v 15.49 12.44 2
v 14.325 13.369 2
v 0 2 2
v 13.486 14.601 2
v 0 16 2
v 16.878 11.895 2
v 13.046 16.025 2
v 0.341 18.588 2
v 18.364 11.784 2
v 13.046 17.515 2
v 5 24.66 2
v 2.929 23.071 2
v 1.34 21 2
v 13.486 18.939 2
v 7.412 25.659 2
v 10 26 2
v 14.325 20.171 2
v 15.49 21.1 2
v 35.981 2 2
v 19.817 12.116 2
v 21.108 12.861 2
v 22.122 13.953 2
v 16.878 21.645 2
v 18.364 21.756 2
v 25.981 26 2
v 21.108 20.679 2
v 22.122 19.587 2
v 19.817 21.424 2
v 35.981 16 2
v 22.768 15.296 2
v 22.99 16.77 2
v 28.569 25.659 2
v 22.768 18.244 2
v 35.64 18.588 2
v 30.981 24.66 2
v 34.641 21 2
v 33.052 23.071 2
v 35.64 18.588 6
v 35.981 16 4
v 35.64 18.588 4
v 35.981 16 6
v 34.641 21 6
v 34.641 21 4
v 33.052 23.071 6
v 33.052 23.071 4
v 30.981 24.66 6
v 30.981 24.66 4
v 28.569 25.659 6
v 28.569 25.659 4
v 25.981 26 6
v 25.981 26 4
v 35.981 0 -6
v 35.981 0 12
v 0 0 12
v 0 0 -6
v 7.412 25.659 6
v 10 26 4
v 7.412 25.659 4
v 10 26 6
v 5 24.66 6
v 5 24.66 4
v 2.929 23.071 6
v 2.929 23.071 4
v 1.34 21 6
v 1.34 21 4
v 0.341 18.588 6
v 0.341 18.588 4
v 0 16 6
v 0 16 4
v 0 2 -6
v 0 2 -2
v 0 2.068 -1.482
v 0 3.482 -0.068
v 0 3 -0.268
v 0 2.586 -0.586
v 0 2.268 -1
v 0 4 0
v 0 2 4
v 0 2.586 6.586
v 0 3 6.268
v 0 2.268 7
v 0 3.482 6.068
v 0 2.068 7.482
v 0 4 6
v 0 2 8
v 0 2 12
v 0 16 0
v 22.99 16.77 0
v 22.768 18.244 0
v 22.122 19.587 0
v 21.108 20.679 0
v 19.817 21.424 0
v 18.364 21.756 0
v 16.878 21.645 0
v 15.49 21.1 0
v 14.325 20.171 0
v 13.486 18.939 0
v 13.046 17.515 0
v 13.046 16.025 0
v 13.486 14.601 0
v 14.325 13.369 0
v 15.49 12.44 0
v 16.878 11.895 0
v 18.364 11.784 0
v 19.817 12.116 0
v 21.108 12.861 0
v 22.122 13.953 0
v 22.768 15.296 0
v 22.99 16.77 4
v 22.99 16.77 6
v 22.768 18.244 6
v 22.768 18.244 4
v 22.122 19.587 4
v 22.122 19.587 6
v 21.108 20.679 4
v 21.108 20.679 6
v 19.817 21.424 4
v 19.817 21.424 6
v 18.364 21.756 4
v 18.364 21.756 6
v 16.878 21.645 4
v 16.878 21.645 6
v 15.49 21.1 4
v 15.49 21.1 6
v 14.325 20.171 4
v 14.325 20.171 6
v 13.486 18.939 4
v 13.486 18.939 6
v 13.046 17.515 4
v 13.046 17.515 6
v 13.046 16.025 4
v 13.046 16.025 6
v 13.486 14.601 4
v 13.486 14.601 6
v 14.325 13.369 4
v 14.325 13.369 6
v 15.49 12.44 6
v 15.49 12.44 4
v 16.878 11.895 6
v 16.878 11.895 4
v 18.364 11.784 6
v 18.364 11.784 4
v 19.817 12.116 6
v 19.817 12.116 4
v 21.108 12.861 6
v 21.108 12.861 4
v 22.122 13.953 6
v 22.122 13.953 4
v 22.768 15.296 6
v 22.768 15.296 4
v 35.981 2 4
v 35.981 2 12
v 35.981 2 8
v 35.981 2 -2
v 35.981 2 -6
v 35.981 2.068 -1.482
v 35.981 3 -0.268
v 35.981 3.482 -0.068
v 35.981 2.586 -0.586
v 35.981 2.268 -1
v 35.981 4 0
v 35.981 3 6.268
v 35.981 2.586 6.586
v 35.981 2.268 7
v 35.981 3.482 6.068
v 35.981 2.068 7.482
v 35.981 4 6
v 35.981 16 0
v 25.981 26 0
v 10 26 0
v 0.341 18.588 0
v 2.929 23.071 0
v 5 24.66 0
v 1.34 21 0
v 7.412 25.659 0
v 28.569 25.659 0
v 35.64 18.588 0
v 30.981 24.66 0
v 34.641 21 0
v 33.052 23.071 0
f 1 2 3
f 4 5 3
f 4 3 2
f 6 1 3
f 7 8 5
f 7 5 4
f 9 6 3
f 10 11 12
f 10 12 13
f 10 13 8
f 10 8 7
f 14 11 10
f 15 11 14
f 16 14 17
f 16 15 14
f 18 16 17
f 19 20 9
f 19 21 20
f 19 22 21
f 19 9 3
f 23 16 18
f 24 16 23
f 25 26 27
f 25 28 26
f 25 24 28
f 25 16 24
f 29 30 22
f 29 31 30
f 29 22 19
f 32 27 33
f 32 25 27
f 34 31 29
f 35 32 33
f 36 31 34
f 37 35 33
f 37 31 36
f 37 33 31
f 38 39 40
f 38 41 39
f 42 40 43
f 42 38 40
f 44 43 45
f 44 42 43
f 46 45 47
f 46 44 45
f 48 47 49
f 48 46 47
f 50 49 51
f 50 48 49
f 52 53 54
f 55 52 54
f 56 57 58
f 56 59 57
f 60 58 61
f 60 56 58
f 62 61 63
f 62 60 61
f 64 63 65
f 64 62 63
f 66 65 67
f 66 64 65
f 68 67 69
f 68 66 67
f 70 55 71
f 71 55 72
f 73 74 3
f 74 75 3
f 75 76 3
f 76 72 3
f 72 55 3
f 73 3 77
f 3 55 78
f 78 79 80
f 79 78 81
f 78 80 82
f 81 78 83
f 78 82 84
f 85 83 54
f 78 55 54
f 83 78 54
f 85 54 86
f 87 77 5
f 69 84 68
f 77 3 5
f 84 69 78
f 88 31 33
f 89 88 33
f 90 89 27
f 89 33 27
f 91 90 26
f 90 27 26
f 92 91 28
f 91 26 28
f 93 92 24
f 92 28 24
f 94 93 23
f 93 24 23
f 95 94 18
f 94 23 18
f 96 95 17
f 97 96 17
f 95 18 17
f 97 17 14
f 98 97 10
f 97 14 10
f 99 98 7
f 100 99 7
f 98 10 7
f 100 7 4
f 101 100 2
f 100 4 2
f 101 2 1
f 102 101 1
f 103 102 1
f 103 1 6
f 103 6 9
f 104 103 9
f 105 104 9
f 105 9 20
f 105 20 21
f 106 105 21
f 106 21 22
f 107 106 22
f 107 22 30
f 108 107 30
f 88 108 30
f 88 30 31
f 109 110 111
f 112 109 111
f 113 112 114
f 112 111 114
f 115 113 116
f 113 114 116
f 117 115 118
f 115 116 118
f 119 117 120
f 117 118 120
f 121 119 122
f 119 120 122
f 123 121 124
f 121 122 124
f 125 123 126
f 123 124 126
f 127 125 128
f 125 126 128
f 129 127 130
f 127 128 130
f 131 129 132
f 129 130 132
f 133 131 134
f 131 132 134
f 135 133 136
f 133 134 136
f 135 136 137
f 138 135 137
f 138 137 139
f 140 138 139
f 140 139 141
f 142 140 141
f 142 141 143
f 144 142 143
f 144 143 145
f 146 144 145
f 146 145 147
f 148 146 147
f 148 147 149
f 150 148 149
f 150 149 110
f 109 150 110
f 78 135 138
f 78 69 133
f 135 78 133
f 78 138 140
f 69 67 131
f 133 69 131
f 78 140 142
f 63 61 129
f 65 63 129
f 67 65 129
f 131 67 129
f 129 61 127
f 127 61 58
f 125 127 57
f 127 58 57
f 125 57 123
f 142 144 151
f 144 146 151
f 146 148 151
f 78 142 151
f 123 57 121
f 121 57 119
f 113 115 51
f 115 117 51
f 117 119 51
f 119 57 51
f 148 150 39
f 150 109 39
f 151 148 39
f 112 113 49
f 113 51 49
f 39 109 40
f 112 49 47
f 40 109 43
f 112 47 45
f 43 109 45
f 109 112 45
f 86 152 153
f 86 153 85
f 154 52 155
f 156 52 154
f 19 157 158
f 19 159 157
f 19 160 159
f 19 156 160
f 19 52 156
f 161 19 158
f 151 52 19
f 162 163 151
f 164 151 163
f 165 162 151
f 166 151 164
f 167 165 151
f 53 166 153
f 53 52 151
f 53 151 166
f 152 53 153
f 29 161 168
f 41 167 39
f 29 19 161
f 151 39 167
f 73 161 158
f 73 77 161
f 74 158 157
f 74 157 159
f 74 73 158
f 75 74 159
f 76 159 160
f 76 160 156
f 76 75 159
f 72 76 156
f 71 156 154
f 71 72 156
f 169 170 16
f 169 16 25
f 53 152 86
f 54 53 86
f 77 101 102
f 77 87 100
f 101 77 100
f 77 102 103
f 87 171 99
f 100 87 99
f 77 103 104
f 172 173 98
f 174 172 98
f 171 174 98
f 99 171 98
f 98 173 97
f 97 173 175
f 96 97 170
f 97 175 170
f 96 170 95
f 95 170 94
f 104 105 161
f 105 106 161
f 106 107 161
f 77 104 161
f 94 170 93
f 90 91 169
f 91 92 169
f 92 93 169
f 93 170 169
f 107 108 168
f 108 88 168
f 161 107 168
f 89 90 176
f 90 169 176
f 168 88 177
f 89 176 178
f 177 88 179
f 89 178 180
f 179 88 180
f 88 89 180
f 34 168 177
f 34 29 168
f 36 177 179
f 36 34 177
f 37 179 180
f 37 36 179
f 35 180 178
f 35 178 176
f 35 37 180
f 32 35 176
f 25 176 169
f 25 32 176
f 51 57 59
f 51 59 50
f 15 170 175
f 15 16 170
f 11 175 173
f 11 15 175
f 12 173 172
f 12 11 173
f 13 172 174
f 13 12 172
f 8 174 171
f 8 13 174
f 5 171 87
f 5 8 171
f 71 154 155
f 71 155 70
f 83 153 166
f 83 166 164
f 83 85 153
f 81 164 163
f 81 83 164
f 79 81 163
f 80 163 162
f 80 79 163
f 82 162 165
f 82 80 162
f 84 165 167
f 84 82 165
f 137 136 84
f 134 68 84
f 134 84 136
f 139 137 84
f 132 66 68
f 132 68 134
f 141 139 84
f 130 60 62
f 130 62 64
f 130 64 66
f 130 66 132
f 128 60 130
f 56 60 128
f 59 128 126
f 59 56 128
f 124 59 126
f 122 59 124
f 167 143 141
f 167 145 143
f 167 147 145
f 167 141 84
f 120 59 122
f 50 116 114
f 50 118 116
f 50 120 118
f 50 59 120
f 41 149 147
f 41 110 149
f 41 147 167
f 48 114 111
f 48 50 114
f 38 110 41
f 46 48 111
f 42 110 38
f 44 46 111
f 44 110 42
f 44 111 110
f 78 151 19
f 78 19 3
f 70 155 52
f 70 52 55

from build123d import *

# Parameters (mm, degrees)
SKETCH1_W                = 35.980750028
SKETCH1_H                = 26
BOSS_EXTRUDE1_DEPTH      = 2
LPATTERN1_COUNT          = 2
LPATTERN1_PITCH          = 4
BOSS_EXTRUDE2_DEPTH      = 6
BOSS_EXTRUDE2_DEPTH_BACK = 12
SKETCH2_W                = 35.980750028
SKETCH2_H                = 2
FILLET1_R                = 2
FILLET2_R                = 10
SKETCH4_R                = 5
CUT_EXTRUDE1_DEPTH       = 6


with BuildPart() as part:
    # Sketch1 → Boss-Extrude1 (new body)
    with BuildSketch(Plane.XY):
        with Locations((17.990375014, 13)):
            Rectangle(SKETCH1_W, SKETCH1_H)
    extrude(amount=BOSS_EXTRUDE1_DEPTH)


with BuildPart() as lpattern1_1:
    # LPattern1: pattern copy
    add(part.part.moved(Location(Vector(0, 0, 1) * (1 * LPATTERN1_PITCH))))


with BuildPart() as part_1:
    add(part.part)

    add(lpattern1_1.part)  # Boss-Extrude2 merges LPattern1_1
    # Sketch2 → Boss-Extrude2 (add, two sides: drawn at the far end of the back side and taken through both)
    with BuildSketch(Plane(origin=(0, 0, 0), x_dir=(-1, 0, 0), z_dir=(0, 0, -1)).offset(-BOSS_EXTRUDE2_DEPTH_BACK)):
        with Locations((-17.990375014, 1)):
            Rectangle(SKETCH2_W, SKETCH2_H)
    extrude(amount=BOSS_EXTRUDE2_DEPTH + BOSS_EXTRUDE2_DEPTH_BACK)

    # Fillet1
    fillet1_edges = [part_1.edges().sort_by_distance(p)[0] for p in [
        (17.990375014, 2, 0),
        (17.990375014, 2, 6),
    ]]
    fillet(fillet1_edges, radius=FILLET1_R)

    # Fillet2
    fillet2_edges = [part_1.edges().sort_by_distance(p)[0] for p in [
        (0, 26, 5),
        (35.980750028, 26, 5),
        (0, 26, 1),
        (35.980750028, 26, 1),
    ]]
    fillet(fillet2_edges, radius=FILLET2_R)

    # Sketch4 → Cut-Extrude1 (cut)
    with BuildSketch(Plane.XY.offset(6)):
        with Locations((17.990375014, 16.77)):
            Circle(SKETCH4_R)
    extrude(amount=-CUT_EXTRUDE1_DEPTH, mode=Mode.SUBTRACT)


solid = part_1.part
